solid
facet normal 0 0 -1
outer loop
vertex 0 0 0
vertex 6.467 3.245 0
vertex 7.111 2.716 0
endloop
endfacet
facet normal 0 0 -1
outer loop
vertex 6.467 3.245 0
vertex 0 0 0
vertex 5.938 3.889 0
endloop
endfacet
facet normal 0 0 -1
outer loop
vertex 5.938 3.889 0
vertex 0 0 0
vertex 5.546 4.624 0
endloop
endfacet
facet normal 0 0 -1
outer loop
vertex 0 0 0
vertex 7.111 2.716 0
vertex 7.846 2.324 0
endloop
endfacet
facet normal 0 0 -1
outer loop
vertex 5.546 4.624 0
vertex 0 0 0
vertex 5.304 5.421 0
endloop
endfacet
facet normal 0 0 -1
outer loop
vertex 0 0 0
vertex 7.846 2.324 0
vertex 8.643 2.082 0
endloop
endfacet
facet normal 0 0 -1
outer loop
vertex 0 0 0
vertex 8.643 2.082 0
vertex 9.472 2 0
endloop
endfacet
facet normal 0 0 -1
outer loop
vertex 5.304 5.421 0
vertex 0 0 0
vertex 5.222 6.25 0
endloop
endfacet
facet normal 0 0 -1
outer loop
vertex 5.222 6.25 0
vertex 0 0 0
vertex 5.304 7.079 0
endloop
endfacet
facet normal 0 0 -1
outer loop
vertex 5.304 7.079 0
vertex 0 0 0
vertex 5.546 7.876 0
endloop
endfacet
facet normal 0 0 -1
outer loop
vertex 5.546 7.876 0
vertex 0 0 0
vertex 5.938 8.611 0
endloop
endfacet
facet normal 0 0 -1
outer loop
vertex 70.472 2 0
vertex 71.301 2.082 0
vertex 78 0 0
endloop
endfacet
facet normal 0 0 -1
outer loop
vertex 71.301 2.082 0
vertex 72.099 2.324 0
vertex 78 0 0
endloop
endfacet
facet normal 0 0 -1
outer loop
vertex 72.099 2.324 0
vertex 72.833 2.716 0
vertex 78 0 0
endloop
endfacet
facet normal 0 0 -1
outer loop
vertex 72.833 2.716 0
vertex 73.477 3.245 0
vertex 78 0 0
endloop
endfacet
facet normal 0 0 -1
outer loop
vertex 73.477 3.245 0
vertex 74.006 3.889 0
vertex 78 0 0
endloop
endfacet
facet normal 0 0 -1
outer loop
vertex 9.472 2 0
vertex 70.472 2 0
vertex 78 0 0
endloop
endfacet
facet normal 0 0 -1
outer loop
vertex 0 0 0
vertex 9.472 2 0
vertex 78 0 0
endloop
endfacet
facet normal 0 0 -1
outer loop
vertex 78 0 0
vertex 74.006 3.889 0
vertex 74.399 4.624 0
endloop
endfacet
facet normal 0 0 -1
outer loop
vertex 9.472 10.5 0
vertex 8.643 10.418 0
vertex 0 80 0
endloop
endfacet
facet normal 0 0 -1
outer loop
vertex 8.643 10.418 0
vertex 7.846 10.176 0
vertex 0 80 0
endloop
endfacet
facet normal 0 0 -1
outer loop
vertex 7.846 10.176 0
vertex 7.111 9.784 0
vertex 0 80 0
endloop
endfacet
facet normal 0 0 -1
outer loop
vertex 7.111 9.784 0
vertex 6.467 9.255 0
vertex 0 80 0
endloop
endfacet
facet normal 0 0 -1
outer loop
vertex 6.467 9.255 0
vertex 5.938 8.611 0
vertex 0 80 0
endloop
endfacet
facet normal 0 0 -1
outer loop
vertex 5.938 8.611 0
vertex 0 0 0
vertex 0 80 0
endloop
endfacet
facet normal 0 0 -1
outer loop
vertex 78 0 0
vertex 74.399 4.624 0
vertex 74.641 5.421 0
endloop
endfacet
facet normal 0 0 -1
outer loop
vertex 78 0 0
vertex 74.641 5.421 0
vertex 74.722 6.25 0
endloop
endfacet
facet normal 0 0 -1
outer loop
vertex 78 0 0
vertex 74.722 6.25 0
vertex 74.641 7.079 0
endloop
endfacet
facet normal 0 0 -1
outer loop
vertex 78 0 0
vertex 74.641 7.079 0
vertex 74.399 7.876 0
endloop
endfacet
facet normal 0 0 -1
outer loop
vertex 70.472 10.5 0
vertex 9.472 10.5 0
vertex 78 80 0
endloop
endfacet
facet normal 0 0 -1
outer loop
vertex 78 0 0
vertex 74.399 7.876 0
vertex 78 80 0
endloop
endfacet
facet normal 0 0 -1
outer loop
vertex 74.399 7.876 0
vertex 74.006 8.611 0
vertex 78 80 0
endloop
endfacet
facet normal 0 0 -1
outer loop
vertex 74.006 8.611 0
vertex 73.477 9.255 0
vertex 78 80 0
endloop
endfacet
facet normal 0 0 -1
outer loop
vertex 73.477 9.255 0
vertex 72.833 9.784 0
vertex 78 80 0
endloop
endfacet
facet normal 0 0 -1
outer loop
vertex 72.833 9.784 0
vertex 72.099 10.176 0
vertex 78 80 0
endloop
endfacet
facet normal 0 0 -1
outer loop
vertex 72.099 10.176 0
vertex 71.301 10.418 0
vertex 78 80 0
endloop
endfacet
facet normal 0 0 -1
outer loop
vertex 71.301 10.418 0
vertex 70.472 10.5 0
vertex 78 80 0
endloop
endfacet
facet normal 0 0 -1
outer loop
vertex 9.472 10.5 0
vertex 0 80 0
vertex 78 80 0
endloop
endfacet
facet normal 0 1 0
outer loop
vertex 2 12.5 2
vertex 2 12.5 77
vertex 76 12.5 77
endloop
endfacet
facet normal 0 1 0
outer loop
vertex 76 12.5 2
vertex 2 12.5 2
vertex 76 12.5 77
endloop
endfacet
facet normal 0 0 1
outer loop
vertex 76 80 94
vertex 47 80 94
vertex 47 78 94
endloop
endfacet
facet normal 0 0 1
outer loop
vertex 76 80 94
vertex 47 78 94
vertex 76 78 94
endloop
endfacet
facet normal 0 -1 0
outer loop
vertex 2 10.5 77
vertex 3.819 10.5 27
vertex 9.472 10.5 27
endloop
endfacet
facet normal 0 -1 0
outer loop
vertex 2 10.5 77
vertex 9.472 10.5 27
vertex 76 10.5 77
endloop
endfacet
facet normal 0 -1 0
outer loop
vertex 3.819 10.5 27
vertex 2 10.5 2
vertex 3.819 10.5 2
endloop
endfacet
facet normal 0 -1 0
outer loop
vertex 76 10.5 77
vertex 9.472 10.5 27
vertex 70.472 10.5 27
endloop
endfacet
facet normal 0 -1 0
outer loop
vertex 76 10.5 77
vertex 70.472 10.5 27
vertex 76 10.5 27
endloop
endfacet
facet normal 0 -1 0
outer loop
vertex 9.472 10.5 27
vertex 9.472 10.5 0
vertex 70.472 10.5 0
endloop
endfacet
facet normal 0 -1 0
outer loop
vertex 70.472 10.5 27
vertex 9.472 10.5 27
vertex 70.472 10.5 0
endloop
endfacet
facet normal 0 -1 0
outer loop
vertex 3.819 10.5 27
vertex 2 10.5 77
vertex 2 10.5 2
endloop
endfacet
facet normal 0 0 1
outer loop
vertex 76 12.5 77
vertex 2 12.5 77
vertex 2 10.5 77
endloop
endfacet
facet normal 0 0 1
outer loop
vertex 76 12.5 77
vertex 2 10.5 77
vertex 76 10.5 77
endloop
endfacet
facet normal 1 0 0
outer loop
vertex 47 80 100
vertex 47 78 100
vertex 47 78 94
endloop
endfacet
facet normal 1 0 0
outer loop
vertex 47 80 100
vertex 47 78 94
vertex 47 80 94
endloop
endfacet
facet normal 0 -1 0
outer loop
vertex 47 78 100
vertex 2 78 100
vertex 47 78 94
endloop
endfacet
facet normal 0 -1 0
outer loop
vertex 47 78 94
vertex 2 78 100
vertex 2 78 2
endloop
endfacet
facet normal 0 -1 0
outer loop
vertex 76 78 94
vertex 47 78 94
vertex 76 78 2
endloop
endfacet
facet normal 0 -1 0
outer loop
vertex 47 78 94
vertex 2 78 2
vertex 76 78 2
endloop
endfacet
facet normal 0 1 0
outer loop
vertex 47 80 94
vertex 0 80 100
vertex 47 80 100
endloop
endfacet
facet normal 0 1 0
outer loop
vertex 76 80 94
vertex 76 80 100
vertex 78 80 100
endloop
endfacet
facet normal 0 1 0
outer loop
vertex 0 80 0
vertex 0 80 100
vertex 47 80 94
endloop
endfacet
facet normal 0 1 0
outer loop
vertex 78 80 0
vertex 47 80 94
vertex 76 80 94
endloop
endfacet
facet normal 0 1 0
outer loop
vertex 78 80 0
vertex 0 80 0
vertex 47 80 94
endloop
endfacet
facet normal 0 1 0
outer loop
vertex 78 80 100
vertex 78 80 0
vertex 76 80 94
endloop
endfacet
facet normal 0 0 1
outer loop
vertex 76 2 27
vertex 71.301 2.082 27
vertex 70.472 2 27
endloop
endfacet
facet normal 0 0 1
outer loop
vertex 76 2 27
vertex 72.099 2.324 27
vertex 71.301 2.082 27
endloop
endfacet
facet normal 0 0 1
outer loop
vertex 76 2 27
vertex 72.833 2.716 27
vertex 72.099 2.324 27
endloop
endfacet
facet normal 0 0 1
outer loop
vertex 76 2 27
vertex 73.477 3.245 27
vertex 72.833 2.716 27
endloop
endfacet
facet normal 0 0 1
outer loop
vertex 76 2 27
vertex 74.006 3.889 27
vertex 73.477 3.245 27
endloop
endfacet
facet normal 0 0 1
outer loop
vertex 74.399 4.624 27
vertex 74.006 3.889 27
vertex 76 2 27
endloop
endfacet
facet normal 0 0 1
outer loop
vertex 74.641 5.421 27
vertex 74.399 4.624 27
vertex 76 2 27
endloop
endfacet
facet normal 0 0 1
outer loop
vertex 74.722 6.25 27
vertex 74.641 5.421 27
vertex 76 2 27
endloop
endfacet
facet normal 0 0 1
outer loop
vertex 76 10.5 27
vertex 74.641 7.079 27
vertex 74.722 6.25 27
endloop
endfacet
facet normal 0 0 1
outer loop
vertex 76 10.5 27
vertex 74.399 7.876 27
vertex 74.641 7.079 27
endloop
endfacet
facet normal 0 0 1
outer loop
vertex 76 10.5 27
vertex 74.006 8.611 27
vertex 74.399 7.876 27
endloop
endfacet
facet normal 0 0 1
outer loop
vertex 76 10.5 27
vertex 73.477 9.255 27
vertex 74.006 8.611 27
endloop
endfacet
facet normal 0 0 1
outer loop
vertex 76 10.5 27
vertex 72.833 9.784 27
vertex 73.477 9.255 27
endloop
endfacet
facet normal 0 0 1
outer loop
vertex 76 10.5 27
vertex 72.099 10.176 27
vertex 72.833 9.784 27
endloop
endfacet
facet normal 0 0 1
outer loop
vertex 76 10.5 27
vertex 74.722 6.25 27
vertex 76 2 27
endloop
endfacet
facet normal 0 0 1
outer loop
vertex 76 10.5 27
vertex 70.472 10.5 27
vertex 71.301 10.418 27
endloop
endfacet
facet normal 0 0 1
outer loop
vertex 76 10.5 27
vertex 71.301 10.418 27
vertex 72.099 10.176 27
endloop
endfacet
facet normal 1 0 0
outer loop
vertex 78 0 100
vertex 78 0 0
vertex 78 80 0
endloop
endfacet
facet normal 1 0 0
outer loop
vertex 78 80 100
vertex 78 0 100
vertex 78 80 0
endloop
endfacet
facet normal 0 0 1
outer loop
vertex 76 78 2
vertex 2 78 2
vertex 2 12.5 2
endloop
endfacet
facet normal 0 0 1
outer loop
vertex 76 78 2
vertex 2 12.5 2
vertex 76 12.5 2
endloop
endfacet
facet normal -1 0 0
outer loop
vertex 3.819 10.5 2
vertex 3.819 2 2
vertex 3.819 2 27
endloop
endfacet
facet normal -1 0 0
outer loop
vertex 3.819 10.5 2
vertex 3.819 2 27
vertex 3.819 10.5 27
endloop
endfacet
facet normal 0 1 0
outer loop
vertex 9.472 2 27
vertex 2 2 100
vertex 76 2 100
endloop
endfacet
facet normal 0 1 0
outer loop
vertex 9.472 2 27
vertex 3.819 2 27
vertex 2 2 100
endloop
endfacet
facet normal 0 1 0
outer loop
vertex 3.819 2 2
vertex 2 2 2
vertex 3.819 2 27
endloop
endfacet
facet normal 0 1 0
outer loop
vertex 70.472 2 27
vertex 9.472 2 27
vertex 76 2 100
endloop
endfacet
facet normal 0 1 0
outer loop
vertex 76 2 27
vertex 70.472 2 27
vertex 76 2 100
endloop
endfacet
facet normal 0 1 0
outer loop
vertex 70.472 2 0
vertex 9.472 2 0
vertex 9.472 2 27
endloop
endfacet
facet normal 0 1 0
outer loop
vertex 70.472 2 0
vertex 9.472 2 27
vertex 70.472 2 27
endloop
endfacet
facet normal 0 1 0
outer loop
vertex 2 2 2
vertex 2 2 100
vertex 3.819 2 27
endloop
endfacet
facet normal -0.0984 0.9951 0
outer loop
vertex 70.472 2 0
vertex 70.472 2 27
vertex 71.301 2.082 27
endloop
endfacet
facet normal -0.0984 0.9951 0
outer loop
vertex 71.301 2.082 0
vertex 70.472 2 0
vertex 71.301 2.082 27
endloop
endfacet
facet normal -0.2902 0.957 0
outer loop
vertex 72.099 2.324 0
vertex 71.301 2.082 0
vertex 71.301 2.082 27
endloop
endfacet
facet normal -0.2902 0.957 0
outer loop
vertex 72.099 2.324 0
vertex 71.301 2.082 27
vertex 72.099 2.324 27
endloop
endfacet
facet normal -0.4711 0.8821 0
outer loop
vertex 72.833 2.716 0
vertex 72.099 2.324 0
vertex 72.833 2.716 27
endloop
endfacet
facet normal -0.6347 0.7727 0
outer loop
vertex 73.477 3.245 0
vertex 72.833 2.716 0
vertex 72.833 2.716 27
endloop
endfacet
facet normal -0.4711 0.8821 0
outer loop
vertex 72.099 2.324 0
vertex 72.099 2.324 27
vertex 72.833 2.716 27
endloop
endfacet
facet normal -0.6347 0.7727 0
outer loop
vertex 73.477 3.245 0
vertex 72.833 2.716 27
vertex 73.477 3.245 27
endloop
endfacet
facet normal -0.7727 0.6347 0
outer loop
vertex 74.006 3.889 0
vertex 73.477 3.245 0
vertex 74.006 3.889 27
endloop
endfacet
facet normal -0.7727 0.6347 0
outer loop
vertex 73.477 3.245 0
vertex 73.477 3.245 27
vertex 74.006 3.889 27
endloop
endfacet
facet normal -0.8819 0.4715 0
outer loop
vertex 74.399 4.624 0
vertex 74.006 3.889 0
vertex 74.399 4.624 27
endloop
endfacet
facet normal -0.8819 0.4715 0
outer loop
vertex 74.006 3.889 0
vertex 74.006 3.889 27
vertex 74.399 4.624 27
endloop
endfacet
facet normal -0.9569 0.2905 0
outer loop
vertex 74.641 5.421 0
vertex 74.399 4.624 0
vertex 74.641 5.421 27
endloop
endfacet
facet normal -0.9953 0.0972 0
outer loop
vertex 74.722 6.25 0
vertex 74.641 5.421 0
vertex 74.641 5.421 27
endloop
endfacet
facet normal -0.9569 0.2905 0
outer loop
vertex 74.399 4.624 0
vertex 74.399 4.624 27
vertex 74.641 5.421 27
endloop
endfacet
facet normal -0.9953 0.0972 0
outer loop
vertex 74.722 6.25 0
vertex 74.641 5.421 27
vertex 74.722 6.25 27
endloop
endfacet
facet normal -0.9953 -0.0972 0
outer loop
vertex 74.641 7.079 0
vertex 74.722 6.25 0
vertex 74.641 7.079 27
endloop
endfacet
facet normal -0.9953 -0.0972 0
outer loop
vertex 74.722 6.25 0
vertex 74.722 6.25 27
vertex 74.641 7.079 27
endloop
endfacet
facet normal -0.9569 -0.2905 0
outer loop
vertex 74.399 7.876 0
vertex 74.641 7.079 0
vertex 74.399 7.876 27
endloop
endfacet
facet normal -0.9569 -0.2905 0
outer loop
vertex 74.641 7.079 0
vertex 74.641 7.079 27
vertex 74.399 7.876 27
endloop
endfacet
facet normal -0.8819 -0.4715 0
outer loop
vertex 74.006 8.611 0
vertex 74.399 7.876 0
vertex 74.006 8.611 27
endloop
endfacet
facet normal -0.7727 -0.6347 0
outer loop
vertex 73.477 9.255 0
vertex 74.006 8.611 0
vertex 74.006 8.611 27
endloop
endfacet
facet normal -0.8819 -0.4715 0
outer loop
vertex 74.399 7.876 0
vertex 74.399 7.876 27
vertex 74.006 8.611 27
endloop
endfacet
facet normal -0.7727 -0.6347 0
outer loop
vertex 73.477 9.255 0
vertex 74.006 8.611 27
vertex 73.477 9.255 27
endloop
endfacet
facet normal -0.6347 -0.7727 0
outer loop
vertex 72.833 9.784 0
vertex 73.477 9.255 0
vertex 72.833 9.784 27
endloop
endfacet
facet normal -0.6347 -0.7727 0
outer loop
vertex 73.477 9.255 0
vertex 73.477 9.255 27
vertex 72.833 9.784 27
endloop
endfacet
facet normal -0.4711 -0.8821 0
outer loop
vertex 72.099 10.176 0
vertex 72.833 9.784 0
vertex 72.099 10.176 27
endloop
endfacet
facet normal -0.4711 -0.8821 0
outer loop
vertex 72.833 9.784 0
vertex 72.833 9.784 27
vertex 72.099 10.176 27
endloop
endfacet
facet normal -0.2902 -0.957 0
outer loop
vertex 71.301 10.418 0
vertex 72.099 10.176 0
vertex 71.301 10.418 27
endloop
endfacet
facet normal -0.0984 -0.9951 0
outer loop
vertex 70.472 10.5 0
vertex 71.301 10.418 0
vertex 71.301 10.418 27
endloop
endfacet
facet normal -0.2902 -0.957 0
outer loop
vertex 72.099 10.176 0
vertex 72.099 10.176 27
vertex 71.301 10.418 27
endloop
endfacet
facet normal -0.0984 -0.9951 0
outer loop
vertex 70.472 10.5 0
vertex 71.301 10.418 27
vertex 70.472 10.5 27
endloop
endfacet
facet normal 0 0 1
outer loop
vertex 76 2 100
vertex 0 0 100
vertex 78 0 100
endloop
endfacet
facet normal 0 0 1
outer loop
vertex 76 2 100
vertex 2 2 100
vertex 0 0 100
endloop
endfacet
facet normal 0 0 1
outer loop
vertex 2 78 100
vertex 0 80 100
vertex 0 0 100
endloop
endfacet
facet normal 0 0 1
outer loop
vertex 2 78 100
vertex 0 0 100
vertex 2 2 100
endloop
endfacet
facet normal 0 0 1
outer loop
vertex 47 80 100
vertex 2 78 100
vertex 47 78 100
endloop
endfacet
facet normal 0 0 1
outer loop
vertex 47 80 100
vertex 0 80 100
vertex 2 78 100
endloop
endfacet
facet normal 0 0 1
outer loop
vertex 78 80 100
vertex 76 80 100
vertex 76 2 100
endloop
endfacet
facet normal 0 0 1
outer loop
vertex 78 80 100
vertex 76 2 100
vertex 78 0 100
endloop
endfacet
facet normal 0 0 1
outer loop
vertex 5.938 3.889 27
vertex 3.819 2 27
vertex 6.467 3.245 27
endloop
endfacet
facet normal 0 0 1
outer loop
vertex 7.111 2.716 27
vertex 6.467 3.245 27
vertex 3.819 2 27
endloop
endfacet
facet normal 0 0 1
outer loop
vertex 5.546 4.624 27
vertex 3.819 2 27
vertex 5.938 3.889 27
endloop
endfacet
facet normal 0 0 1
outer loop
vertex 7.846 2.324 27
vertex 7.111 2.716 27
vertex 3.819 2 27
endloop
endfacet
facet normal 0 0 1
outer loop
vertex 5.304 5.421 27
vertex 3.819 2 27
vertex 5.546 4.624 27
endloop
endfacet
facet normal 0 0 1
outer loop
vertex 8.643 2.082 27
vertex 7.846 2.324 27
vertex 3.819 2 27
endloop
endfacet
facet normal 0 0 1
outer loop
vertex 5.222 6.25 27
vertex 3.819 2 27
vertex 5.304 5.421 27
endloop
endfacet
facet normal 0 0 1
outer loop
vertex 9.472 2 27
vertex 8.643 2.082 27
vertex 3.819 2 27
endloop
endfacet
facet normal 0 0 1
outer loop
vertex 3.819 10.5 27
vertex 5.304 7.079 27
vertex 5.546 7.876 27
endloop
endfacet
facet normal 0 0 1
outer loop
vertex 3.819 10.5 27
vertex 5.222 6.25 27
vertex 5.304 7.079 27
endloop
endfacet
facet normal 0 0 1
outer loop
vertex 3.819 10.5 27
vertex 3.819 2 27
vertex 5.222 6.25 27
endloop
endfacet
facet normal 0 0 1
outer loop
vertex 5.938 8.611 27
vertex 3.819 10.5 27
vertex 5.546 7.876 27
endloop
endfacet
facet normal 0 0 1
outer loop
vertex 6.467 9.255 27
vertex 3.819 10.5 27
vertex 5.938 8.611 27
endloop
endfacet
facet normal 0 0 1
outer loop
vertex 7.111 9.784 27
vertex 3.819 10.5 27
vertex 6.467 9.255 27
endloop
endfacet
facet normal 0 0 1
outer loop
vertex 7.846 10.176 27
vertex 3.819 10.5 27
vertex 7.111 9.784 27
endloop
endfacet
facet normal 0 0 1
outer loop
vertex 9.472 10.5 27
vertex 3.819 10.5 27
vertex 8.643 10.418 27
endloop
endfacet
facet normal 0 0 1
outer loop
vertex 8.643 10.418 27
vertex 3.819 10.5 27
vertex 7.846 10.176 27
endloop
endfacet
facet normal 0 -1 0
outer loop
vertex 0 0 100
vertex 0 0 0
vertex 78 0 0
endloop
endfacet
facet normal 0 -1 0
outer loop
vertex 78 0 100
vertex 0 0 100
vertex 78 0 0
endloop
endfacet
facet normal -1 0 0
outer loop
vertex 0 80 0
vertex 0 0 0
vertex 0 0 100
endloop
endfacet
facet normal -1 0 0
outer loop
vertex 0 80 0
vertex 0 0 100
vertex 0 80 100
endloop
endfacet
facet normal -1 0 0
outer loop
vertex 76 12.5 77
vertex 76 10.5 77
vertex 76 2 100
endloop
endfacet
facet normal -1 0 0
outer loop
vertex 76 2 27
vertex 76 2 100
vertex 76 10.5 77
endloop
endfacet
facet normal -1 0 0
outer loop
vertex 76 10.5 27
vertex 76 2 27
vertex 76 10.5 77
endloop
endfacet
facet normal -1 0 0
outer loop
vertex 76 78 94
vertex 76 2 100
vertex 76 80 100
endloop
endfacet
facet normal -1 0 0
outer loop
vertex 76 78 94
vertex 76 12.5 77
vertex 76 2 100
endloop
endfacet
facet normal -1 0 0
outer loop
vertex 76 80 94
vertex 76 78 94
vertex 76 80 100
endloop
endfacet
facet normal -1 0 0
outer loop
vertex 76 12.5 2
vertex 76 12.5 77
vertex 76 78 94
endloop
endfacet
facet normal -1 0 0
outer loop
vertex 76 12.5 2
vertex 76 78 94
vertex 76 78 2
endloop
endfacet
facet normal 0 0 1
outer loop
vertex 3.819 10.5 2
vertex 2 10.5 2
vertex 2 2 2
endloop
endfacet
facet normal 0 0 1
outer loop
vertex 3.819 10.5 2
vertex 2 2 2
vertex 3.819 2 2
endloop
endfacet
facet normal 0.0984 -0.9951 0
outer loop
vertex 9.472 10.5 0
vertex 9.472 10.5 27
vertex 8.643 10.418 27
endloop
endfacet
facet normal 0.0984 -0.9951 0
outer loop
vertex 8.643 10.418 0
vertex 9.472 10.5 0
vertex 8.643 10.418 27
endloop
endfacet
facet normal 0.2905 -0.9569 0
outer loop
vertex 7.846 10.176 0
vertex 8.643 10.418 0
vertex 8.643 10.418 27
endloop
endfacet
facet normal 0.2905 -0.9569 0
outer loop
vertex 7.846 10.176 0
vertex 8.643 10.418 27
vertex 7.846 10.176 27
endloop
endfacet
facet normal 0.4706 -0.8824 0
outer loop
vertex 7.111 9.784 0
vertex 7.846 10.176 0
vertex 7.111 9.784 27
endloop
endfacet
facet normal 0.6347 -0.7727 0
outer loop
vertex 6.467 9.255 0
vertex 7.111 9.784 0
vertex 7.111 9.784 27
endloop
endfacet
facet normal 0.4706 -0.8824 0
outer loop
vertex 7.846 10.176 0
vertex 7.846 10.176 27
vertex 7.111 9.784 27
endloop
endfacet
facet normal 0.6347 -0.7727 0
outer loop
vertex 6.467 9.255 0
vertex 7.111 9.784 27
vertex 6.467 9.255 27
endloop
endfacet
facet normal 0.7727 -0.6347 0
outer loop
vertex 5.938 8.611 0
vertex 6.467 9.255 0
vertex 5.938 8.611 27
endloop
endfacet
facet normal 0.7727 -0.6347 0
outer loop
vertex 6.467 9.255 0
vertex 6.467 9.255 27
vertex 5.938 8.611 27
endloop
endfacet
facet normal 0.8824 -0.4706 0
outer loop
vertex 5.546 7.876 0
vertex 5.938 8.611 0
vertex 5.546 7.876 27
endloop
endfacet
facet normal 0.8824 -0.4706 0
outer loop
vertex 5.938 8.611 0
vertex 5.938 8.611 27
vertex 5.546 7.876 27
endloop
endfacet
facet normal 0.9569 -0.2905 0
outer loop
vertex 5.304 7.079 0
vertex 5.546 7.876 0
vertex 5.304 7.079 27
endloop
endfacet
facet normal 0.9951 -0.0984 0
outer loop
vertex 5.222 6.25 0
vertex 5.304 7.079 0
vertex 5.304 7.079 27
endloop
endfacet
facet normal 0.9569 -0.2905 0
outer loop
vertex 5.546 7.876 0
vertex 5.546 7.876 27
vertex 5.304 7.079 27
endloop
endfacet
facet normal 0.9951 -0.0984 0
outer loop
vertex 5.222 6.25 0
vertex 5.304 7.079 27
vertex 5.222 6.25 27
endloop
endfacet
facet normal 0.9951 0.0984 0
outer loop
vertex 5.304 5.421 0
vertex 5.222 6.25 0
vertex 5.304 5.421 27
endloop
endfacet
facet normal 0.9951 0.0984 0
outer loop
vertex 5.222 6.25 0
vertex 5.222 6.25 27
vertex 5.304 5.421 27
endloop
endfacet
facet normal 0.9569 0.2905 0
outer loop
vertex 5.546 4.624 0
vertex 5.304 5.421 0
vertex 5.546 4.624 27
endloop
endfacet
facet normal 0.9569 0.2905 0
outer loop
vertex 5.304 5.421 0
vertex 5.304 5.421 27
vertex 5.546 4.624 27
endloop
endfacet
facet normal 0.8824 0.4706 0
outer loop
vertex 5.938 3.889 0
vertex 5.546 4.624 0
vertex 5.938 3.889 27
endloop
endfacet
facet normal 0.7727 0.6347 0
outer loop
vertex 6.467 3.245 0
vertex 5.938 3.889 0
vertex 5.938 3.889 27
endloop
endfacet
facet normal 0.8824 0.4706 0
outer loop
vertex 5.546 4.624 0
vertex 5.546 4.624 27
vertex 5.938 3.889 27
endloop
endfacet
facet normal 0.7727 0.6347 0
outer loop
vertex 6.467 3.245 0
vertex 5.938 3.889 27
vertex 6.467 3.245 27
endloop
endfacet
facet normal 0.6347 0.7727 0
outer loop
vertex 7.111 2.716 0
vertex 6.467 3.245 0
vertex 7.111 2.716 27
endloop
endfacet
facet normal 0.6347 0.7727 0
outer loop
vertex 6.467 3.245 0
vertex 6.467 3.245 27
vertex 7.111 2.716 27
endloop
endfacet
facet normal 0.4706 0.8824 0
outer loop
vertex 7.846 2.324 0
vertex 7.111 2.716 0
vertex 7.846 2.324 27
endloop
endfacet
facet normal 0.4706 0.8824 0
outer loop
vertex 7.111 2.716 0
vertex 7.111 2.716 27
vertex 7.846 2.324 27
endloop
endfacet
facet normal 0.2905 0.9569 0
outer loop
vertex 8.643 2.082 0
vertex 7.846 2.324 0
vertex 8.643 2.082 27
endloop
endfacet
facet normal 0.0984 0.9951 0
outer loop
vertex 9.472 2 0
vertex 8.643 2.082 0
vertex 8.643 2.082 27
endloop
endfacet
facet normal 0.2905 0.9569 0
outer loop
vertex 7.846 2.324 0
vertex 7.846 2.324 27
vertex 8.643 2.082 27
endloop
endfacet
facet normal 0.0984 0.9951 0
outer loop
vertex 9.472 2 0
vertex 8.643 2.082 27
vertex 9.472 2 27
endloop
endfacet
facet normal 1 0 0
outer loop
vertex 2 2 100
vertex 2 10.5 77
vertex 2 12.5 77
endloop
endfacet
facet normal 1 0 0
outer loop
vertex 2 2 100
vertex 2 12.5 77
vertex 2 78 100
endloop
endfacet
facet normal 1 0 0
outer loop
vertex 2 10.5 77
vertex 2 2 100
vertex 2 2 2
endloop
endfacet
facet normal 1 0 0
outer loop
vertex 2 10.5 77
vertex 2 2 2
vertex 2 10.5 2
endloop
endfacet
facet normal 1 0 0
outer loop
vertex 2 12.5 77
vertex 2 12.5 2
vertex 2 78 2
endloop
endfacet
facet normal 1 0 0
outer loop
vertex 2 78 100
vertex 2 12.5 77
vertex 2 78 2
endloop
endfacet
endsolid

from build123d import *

# Parameters (mm, degrees)
F0_W      = 78
F0_H      = 80
F1_DEPTH  = 100
F2_T      = -2
F3_W      = 74
F3_H      = 2
F4_DEPTH  = 75
F5_W      = 72.1805748753
F5_H      = 9.0993850976
F6_DEPTH  = 25
F8_DEPTH  = 38.5
F9_W      = 29
F9_H      = 2
F10_DEPTH = 6


with BuildPart() as f1:
    # F0 (on Top) → F1 (new body)
    with BuildSketch(Plane.XY):
        with Locations((39, 40)):
            Rectangle(F0_W, F0_H)
    extrude(amount=F1_DEPTH)

    # F2
    f2_openings = [f1.faces().sort_by_distance(p)[0] for p in [
        (39, 40, 100),
    ]]
    offset(amount=F2_T, openings=f2_openings)

    # F3 (on face) → F4 (join)
    with BuildSketch(Plane.XY.offset(2)):
        with Locations((39, 11.5)):
            Rectangle(F3_W, F3_H)
    extrude(amount=F4_DEPTH)

    # F5 (on face) → F6 (join)
    with BuildSketch(Plane.XY.offset(2)):
        with Locations((39.9097125623, 6.5496925488)):
            Rectangle(F5_W, F5_H)
    extrude(amount=F6_DEPTH)

    # F7 (on face) → F8 (cut)
    with BuildSketch(Plane.XY.offset(27)):
        with BuildLine():
            Line((70.4722125623, 10.5), (9.4722125623, 10.5))
            ThreePointArc((9.4722125623, 10.5), (5.2222125623, 6.25), (9.4722125623, 2))
            Line((9.4722125623, 2), (70.4722125623, 2))
            ThreePointArc((70.4722125623, 2), (74.7222125623, 6.25), (70.4722125623, 10.5))
        make_face()
    extrude(amount=-F8_DEPTH, mode=Mode.SUBTRACT)

    # F9 (on face) → F10 (cut)
    with BuildSketch(Plane.XY.offset(100)):
        with Locations((61.5, 79)):
            Rectangle(F9_W, F9_H)
    extrude(amount=-F10_DEPTH, mode=Mode.SUBTRACT)


solid = f1.part
